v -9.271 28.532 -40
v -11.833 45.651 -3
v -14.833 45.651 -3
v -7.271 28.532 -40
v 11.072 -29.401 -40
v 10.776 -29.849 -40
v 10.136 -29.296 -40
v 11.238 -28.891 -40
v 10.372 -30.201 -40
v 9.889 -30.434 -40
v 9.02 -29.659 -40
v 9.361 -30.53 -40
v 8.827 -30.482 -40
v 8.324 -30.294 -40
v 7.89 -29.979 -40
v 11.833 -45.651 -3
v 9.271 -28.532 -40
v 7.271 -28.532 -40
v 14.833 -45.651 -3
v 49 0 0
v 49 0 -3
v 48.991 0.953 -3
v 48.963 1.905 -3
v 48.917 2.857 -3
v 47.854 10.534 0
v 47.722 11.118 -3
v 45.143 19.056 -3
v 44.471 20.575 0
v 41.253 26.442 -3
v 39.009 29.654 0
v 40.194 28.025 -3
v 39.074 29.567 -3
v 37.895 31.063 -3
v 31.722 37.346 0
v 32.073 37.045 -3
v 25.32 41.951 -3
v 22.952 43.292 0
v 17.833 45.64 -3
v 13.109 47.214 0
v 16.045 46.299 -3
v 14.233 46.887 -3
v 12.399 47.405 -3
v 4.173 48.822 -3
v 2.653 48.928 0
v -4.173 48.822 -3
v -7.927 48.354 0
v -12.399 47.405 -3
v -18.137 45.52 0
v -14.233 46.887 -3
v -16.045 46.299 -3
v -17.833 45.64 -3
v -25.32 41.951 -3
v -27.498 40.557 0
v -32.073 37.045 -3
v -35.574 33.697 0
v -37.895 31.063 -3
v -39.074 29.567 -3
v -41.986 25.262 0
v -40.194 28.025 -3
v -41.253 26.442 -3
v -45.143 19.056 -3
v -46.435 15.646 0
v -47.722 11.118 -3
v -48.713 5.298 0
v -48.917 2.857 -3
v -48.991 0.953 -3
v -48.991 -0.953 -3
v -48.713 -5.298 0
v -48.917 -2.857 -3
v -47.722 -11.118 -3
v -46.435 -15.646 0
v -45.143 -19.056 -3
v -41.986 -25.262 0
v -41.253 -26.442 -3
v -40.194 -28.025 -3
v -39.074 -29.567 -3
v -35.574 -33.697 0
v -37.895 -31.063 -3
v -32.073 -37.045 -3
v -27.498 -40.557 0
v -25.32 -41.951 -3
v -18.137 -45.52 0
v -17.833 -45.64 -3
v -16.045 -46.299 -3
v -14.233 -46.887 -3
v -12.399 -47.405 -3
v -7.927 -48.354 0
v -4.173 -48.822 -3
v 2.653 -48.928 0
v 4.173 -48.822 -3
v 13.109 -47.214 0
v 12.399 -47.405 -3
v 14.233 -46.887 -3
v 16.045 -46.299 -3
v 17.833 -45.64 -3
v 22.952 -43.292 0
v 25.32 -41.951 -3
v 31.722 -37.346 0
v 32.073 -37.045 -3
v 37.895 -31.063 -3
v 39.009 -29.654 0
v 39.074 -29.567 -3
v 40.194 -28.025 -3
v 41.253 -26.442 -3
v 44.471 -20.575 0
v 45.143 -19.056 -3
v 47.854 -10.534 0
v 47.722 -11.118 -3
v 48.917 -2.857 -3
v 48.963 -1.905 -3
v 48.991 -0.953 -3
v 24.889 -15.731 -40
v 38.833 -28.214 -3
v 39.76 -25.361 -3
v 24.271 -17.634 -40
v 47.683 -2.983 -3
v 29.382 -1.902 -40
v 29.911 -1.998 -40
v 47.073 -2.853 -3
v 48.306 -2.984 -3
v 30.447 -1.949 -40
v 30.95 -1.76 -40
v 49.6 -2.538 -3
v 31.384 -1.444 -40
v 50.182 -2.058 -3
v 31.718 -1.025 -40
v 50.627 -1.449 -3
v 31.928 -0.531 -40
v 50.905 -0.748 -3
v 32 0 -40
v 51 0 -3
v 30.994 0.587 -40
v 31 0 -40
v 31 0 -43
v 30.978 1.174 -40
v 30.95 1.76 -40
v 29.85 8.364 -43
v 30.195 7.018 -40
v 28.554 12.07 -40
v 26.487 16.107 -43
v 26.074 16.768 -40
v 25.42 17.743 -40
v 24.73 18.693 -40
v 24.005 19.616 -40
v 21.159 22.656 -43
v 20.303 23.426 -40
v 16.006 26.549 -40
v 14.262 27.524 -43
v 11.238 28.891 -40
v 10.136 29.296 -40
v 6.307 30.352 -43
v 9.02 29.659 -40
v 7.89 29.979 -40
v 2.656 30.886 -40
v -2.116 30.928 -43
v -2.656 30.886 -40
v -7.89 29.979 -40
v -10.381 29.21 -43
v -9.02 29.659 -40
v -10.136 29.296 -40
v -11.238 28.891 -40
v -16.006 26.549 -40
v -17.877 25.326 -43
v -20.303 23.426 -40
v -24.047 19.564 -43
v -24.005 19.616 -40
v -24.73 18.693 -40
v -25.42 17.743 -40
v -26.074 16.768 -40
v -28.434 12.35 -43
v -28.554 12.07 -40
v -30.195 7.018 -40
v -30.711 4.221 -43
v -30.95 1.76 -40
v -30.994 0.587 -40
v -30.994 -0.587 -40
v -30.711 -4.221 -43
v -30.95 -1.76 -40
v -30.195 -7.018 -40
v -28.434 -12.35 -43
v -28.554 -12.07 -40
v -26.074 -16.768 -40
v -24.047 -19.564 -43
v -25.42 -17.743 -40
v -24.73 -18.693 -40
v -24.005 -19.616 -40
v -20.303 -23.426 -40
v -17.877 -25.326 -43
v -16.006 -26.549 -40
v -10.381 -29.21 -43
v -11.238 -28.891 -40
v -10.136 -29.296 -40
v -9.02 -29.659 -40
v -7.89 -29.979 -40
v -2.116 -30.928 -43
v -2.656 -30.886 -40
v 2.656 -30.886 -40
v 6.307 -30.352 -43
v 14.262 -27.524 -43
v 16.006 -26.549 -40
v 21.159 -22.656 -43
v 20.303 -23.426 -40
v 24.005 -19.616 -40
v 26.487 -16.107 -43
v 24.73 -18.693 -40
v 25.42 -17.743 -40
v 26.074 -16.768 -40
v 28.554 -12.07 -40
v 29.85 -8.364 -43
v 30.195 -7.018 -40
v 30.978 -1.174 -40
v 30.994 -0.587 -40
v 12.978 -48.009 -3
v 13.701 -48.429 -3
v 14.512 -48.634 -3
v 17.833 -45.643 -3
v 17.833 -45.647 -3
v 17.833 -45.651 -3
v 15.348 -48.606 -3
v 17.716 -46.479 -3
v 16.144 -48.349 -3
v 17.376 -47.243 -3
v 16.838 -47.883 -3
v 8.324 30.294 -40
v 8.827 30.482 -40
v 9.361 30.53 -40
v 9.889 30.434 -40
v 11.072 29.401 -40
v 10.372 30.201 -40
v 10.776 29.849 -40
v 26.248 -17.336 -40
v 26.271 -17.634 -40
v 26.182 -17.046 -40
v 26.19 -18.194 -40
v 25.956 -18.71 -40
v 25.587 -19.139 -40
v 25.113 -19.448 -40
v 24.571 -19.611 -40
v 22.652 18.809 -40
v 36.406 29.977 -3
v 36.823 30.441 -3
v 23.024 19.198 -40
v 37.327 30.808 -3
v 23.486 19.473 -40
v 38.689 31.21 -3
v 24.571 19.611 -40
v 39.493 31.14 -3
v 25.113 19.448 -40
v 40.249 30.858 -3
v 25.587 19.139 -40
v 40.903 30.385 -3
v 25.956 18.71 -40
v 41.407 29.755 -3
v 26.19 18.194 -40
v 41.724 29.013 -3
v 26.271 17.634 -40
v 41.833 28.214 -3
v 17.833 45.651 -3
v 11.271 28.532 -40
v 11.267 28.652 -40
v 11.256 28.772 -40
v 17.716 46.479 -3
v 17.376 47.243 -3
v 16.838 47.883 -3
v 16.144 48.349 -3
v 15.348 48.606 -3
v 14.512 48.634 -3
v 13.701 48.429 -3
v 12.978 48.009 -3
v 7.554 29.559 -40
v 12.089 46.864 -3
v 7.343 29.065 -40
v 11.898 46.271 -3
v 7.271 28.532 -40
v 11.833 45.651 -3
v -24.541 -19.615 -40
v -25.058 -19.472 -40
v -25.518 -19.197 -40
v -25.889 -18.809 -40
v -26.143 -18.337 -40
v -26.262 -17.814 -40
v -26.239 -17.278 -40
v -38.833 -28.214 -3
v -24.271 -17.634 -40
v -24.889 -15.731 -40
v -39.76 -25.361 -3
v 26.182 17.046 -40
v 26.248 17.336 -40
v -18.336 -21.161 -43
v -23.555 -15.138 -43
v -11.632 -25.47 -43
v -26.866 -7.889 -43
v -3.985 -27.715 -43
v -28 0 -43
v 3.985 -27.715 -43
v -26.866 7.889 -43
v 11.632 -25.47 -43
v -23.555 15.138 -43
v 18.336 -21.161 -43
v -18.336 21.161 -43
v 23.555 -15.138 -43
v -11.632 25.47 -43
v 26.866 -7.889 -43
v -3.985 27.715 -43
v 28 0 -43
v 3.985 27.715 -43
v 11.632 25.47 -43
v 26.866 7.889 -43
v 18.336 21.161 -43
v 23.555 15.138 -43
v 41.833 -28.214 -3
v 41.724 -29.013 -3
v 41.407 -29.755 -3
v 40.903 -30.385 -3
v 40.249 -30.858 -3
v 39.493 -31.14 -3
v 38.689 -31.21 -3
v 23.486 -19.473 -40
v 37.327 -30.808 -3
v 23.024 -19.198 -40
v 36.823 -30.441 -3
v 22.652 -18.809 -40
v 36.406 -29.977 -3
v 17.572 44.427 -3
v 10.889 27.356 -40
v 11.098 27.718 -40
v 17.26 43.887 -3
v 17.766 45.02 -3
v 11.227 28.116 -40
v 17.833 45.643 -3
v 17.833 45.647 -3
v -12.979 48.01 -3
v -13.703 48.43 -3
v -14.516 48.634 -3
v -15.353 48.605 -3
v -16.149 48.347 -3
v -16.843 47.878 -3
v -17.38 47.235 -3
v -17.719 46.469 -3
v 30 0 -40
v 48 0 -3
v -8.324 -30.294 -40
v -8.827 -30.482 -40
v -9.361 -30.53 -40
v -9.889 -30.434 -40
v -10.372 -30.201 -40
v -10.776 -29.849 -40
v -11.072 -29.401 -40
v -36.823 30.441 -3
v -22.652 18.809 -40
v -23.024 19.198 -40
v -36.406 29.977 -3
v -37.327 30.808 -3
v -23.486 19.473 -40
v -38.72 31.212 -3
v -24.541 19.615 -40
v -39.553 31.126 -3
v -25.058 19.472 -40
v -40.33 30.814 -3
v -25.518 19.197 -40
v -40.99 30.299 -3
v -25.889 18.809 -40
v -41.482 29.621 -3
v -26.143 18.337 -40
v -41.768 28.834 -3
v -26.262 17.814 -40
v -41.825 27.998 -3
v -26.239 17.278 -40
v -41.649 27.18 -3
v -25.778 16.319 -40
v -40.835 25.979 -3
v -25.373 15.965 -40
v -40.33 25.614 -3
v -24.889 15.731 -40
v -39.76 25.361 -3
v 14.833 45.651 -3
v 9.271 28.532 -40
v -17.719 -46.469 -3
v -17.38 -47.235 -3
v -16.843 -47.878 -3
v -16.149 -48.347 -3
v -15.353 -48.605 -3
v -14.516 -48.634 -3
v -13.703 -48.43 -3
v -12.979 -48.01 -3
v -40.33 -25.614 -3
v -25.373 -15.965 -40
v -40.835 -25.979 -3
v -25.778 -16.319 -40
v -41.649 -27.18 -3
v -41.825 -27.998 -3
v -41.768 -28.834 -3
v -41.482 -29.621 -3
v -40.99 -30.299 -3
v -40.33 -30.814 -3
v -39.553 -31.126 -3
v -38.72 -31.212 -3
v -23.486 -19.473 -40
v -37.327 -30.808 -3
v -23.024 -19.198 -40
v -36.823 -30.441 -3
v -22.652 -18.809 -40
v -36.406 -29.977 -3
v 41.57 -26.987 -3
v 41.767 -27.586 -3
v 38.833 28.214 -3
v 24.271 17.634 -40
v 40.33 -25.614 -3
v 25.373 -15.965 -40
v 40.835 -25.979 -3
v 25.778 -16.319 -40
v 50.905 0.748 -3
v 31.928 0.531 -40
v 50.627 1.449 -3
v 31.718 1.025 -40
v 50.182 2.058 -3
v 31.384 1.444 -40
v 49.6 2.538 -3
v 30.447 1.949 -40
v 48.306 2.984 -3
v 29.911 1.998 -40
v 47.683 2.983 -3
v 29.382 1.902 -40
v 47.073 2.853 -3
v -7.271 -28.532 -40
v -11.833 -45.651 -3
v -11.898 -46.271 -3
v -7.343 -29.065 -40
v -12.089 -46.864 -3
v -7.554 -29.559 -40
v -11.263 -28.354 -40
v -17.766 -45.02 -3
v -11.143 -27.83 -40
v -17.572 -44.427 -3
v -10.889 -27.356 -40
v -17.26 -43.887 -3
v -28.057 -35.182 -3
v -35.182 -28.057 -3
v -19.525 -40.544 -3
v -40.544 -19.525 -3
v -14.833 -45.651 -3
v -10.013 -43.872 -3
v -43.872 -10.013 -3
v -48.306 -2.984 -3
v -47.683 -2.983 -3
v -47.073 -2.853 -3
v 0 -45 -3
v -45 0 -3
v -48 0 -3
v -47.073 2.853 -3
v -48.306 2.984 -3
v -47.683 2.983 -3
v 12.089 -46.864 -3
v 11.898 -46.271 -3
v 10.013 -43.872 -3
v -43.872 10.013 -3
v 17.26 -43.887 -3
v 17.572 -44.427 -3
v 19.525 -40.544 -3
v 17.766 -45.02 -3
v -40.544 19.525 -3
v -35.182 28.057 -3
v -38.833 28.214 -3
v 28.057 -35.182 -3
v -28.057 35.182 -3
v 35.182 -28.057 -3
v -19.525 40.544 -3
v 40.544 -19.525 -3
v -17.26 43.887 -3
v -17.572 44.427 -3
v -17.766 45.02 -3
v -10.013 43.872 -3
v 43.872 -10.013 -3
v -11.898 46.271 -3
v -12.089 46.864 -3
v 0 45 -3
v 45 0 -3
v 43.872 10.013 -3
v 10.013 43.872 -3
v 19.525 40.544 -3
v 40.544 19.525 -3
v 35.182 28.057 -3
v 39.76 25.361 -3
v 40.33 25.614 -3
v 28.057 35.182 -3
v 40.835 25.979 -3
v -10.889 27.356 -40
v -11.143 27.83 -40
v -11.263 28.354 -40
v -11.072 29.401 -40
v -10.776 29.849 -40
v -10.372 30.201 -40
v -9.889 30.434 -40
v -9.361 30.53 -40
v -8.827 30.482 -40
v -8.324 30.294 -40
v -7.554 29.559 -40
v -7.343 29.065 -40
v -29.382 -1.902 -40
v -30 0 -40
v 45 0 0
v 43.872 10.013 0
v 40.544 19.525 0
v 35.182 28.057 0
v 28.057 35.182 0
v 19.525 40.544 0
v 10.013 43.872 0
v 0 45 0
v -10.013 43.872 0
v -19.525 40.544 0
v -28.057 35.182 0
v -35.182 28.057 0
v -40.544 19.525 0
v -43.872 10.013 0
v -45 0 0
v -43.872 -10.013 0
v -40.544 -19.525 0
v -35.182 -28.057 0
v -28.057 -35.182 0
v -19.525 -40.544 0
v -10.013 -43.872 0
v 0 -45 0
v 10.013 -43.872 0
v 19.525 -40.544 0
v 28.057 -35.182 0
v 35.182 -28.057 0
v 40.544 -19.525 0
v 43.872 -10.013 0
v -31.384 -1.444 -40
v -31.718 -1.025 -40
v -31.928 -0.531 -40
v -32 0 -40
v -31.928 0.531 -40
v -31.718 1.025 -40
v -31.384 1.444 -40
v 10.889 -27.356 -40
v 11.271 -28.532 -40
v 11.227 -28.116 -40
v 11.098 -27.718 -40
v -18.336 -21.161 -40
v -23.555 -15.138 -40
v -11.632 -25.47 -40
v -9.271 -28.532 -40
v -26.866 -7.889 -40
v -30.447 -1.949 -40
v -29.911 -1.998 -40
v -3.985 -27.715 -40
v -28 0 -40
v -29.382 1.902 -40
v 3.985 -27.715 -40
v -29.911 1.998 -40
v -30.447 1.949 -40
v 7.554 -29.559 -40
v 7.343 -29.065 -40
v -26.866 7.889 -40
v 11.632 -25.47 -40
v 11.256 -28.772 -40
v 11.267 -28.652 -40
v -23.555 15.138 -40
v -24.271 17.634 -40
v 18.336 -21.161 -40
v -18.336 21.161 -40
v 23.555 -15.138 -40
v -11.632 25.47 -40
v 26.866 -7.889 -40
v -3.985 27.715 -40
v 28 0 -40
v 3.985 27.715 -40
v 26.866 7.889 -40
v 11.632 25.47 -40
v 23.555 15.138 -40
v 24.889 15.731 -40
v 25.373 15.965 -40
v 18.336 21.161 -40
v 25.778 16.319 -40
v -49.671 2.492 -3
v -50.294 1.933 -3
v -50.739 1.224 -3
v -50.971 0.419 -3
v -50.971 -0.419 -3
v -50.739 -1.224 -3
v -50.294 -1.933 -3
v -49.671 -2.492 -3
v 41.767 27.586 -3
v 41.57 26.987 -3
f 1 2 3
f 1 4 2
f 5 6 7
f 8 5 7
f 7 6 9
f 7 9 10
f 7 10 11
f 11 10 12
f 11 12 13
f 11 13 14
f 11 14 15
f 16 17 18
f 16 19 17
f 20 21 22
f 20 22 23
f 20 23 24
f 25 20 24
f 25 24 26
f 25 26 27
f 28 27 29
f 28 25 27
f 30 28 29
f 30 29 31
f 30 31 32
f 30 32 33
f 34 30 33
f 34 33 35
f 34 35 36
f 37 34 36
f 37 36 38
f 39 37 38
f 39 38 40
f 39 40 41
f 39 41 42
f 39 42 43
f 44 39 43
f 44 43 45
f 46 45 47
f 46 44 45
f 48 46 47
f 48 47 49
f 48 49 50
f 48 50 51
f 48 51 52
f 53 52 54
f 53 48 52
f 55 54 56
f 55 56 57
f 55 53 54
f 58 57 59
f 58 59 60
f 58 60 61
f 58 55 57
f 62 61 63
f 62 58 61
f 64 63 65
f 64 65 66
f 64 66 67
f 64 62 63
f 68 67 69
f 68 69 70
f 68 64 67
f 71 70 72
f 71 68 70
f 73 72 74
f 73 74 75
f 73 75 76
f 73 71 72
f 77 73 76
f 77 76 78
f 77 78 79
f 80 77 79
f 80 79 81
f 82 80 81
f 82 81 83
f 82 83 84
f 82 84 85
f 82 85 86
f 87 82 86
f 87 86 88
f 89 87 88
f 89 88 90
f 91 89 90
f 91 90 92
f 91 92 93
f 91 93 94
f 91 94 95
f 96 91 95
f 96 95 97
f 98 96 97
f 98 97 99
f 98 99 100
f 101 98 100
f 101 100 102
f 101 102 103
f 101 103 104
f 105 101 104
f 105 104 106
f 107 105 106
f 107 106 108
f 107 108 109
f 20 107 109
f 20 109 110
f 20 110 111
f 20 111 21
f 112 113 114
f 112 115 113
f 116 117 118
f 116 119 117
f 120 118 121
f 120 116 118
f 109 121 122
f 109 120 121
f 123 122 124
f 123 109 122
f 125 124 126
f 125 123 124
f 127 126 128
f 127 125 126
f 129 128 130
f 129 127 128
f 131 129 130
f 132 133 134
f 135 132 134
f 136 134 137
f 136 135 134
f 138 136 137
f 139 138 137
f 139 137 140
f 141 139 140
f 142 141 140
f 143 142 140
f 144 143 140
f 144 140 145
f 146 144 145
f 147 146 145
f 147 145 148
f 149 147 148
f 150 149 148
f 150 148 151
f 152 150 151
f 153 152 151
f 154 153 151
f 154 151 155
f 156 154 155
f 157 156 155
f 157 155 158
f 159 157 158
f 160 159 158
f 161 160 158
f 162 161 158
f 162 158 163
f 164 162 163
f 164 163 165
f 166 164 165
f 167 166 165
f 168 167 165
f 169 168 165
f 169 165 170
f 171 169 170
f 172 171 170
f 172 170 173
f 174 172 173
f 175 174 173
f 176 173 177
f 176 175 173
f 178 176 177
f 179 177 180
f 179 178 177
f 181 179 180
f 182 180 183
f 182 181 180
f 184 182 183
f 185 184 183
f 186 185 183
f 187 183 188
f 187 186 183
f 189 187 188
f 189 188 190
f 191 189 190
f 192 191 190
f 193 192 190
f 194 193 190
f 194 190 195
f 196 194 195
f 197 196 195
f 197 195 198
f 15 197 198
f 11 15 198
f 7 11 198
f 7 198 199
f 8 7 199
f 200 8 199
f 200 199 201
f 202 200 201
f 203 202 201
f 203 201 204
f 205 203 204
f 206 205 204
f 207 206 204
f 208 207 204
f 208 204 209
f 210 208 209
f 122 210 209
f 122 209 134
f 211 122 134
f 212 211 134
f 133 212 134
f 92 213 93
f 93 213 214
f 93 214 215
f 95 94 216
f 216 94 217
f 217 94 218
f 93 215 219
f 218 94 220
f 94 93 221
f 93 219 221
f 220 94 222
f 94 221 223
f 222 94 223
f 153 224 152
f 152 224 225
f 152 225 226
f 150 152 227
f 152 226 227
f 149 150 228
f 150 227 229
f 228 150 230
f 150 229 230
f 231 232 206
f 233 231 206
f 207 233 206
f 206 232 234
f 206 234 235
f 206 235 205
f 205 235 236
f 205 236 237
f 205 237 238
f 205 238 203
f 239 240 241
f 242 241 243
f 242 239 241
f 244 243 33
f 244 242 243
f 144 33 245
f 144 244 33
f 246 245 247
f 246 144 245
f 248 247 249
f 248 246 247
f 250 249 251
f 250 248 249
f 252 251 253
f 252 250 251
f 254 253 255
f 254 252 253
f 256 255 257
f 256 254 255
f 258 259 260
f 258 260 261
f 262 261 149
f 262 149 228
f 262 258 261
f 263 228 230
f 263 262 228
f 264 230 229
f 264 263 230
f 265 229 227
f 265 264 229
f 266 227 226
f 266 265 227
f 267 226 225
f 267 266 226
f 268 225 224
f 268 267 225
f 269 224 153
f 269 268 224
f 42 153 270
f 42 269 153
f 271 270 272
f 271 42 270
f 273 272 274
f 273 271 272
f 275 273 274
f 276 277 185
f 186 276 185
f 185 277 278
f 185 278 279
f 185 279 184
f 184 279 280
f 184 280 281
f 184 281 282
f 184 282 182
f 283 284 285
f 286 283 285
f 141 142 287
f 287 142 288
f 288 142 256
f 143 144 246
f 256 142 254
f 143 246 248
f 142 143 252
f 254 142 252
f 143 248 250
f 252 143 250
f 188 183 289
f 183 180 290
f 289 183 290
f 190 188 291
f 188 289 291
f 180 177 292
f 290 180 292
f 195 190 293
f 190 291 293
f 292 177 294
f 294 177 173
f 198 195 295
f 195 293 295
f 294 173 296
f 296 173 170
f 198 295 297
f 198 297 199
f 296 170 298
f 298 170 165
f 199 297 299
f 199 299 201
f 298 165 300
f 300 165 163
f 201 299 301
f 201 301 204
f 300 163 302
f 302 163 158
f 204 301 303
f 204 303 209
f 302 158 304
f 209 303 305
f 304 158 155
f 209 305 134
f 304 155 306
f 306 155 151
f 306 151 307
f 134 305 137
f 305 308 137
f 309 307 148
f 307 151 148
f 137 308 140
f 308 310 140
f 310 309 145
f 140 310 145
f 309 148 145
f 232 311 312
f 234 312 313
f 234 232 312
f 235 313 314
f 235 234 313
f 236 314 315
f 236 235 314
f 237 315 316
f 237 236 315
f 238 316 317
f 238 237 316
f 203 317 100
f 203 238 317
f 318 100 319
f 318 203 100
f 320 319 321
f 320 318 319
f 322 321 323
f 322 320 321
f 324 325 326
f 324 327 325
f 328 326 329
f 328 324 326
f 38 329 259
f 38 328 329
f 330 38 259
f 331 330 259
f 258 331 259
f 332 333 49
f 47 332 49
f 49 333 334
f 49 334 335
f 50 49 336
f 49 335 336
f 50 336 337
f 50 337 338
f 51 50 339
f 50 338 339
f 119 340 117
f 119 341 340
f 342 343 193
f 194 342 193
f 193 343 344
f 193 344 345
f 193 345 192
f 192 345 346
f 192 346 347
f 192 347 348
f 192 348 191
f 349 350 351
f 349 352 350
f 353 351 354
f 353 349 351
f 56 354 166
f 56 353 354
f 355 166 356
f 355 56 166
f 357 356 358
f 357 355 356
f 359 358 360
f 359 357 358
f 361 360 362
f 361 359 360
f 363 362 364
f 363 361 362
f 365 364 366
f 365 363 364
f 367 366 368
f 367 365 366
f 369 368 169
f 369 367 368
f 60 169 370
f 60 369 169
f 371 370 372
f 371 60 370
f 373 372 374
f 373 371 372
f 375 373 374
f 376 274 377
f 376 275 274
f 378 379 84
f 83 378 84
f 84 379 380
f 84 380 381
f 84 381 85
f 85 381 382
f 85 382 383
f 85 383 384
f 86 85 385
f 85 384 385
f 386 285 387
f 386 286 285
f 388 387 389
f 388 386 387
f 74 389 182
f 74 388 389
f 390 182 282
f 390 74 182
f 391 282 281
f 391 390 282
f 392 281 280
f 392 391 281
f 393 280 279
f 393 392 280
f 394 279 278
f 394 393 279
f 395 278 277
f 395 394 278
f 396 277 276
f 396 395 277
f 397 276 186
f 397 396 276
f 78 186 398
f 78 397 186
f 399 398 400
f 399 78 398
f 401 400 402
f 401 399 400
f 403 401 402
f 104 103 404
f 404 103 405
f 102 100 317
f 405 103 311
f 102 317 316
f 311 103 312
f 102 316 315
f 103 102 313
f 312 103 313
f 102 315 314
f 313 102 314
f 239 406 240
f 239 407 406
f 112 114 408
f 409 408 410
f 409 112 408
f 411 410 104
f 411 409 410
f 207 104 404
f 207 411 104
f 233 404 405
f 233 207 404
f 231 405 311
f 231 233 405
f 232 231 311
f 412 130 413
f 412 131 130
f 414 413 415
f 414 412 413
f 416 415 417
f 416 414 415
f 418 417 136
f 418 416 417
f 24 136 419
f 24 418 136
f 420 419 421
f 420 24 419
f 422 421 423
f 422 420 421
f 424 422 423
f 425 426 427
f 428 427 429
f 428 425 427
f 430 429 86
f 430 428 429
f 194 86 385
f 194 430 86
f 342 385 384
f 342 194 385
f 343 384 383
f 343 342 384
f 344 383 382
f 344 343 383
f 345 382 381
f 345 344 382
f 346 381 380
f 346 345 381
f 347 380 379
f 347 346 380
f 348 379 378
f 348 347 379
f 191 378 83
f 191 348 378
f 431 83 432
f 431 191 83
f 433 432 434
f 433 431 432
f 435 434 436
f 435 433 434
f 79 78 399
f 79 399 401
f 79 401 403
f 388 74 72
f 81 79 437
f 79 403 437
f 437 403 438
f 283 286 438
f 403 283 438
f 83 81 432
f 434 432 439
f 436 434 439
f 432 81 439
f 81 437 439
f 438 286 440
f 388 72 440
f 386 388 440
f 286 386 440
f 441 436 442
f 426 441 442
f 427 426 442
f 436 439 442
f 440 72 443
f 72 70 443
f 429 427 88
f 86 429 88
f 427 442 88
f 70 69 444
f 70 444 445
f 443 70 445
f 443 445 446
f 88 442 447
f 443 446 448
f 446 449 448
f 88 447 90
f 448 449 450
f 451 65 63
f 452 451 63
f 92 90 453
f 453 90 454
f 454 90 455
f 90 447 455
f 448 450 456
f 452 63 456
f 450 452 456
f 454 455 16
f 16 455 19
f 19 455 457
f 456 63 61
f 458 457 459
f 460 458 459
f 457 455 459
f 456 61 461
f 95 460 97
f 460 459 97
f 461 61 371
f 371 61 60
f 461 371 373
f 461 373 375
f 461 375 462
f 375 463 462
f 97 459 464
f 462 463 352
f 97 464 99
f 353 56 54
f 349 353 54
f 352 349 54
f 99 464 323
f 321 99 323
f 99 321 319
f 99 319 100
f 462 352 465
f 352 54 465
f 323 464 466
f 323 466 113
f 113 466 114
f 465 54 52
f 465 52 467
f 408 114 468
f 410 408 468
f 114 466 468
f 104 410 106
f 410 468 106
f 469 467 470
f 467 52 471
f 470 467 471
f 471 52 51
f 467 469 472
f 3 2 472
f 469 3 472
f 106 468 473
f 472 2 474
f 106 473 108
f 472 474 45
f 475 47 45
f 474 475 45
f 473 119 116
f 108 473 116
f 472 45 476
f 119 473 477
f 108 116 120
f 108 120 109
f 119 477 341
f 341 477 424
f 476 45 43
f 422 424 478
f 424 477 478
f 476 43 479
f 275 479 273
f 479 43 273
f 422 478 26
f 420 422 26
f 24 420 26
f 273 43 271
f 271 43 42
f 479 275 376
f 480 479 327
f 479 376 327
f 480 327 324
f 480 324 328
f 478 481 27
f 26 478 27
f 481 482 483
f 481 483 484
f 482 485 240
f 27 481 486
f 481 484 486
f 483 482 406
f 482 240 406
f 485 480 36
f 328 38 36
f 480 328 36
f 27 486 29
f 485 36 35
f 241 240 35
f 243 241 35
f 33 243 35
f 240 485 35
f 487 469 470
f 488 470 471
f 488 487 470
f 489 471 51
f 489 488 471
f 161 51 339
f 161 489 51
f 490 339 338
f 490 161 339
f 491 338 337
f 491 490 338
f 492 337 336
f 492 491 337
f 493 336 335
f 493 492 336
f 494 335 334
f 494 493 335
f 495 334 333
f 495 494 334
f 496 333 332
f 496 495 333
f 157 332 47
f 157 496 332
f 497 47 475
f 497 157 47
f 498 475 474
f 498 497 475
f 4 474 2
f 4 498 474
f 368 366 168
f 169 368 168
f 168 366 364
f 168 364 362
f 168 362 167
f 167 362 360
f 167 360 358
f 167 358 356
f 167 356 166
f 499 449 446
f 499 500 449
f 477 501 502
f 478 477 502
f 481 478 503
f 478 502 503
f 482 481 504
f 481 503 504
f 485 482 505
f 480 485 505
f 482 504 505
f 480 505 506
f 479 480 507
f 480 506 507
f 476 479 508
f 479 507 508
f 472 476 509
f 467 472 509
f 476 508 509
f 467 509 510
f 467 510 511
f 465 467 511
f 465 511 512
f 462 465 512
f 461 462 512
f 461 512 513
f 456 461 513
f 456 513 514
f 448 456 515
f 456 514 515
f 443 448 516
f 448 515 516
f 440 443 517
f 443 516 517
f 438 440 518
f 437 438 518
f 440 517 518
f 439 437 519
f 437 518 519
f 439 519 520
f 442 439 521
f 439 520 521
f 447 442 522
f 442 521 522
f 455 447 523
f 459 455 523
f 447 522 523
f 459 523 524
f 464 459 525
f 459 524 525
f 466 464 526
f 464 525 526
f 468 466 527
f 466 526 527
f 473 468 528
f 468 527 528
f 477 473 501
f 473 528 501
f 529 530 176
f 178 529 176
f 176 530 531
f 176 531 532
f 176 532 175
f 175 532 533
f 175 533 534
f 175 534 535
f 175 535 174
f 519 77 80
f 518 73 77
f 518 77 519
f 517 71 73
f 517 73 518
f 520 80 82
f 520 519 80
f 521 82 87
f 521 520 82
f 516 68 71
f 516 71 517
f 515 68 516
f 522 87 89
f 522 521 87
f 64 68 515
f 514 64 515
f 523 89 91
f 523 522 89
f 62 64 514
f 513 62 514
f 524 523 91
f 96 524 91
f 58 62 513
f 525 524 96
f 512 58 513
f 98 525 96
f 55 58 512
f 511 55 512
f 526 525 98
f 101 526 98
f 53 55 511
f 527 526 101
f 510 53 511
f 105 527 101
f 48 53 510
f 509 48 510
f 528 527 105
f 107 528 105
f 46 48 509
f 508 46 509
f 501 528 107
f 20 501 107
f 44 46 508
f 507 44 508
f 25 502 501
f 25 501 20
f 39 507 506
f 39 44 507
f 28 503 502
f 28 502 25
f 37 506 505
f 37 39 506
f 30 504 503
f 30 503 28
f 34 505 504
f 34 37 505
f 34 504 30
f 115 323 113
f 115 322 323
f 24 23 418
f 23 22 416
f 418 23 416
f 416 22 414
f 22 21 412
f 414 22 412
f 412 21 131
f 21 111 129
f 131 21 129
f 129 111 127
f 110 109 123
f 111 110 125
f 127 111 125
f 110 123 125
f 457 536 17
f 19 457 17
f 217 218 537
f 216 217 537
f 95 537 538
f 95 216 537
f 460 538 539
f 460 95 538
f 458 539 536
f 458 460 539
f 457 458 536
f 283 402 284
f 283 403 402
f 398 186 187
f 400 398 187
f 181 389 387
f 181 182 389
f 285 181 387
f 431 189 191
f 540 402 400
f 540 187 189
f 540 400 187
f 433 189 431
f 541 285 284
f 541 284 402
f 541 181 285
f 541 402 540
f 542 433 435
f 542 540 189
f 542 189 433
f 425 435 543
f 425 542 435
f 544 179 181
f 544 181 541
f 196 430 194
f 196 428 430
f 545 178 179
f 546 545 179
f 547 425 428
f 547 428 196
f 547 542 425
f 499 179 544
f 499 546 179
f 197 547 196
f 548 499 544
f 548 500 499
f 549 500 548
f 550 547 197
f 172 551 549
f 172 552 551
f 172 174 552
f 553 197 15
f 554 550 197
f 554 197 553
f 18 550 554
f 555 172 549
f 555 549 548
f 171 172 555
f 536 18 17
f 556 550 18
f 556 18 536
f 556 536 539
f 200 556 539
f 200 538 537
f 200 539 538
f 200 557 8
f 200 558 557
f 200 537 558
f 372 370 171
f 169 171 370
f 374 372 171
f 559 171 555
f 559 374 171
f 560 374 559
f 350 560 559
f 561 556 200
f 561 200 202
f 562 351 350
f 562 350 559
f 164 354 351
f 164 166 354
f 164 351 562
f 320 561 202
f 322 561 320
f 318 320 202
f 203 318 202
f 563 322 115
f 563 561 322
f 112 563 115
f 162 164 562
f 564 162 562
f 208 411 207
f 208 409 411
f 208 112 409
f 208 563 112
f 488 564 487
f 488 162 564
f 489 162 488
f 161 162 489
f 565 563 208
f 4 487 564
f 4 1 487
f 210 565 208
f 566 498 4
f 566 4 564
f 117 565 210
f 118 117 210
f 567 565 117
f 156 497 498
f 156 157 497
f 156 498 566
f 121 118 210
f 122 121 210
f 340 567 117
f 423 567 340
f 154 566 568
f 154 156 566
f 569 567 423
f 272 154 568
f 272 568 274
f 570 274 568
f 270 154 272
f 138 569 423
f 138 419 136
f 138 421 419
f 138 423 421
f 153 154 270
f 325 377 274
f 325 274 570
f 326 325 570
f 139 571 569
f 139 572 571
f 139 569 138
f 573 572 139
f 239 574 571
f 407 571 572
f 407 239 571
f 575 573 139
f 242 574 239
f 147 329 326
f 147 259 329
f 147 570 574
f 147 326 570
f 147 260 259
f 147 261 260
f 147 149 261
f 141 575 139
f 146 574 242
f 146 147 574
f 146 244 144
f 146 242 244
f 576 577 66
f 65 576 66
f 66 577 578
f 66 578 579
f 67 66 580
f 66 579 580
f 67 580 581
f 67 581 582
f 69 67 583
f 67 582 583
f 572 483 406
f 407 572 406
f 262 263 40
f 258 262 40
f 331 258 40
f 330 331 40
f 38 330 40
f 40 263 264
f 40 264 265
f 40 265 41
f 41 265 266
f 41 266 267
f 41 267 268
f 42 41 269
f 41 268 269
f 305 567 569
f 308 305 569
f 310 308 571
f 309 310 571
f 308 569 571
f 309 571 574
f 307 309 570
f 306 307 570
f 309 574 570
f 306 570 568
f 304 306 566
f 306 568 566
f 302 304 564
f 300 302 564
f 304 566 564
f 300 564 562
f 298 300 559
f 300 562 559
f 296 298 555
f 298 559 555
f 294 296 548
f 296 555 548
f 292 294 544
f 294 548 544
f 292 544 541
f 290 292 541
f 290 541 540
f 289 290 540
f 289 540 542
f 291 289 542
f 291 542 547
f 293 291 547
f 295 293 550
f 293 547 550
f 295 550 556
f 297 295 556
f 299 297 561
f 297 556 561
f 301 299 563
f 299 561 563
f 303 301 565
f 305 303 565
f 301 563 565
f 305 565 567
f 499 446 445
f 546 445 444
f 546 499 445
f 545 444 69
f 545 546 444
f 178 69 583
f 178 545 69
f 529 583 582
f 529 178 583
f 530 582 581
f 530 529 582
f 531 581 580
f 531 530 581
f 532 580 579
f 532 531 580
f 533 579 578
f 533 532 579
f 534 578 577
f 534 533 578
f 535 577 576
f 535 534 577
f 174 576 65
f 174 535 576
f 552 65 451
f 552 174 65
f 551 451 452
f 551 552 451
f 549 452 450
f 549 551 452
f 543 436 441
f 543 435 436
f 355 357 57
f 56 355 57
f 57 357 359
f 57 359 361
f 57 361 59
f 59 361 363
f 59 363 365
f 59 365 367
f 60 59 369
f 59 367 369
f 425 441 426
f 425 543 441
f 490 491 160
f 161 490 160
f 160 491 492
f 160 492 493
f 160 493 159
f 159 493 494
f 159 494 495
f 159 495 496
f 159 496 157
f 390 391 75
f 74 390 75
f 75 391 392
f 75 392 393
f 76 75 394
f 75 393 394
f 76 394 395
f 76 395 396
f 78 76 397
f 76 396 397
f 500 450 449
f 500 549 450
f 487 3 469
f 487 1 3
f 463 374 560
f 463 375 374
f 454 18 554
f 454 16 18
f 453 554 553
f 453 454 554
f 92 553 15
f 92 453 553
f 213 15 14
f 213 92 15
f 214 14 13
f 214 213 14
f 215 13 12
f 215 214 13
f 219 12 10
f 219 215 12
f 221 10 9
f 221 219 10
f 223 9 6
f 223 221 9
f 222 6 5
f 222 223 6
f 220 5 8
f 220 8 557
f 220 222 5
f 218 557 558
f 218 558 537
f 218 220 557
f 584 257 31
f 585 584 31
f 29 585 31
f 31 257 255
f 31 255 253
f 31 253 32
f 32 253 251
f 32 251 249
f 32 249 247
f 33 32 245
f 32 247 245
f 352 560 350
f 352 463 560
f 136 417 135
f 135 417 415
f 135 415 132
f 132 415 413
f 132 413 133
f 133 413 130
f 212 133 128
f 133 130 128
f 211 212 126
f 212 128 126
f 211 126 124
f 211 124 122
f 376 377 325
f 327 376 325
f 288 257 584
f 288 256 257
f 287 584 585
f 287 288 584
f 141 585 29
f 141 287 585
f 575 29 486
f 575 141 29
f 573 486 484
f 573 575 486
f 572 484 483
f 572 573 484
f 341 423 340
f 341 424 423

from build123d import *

# Parameters (mm, degrees)
F0_R     = 45
F1_DEPTH = 3
F0_R_2   = 49
F3_DEPTH = 3
F5_R     = 28
F6_DEPTH = 3
F5_R_2   = 31
F8_DEPTH = 3


with BuildPart() as f1:
    # F0 (on Top) → F1 (new body)
    with BuildSketch(Plane.XY):
        Polygon((38.83281573, -28.21369211), (48, 0), (38.83281573, 28.21369211), (14.83281573, 45.6507127822), (-14.83281573, 45.6507127822), (-38.83281573, 28.21369211), (-48, 0), (-38.83281573, -28.21369211), (-14.83281573, -45.6507127822), (14.83281573, -45.6507127822), align=None)
        Circle(F0_R, mode=Mode.SUBTRACT)
    extrude(amount=-F1_DEPTH)

    # F0 (on Top) → F3 (join)
    with BuildSketch(Plane.XY):
        Circle(F0_R_2)
        Polygon((38.83281573, 28.21369211), (48, 0), (38.83281573, -28.21369211), (14.83281573, -45.6507127822), (-14.83281573, -45.6507127822), (-38.83281573, -28.21369211), (-48, 0), (-38.83281573, 28.21369211), (-14.83281573, 45.6507127822), (14.83281573, 45.6507127822), align=None, mode=Mode.SUBTRACT)
    extrude(amount=-F3_DEPTH)



with BuildPart() as f6:
    # F5 (on offset) → F6 (new body)
    with BuildSketch(Plane.XY.offset(-40)):
        Polygon((24.2705098312, -17.6335575688), (30, 0), (24.2705098312, 17.6335575688), (9.2705098312, 28.5316954889), (-9.2705098312, 28.5316954889), (-24.2705098312, 17.6335575688), (-30, 0), (-24.2705098312, -17.6335575688), (-9.2705098312, -28.5316954889), (9.2705098312, -28.5316954889), align=None)
        Circle(F5_R, mode=Mode.SUBTRACT)
    extrude(amount=-F6_DEPTH)

    # F5 (on offset) → F8 (join)
    with BuildSketch(Plane.XY.offset(-40)):
        Circle(F5_R_2)
        Polygon((24.2705098312, 17.6335575688), (30, 0), (24.2705098312, -17.6335575688), (9.2705098312, -28.5316954889), (-9.2705098312, -28.5316954889), (-24.2705098312, -17.6335575688), (-30, 0), (-24.2705098312, 17.6335575688), (-9.2705098312, 28.5316954889), (9.2705098312, 28.5316954889), align=None, mode=Mode.SUBTRACT)
    extrude(amount=-F8_DEPTH)


with BuildPart() as f1_1:
    add(f1.part)

    add(f6.part)  # F9 merges F6
    # F2 (on face) → F9 section 0
    with BuildSketch(Plane(origin=(0, 0, -3), x_dir=(1, 0, 0), z_dir=(0, 0, -1))):
        with BuildLine():
            ThreePointArc((-47.0729490169, 2.8531695489), (-51, 0), (-47.0729490169, -2.8531695489))
            Line((-47.0729490169, -2.8531695489), (-48, 0))
            Line((-48, 0), (-47.0729490169, 2.8531695489))
        make_face()
    # F7 (on face) → F9 section 1
    with BuildSketch(Plane.XY.offset(-40)):
        with BuildLine():
            ThreePointArc((-29.3819660113, 1.9021130326), (-32, 0), (-29.3819660113, -1.9021130326))
            Line((-29.3819660113, -1.9021130326), (-30, 0))
            Line((-30, 0), (-29.3819660113, 1.9021130326))
        make_face()
    loft()

    # F7 (on face) → F10 section 0
    with BuildSketch(Plane.XY.offset(-40)):
        with BuildLine():
            ThreePointArc((-24.88854382, -15.7314445362), (-25.88854382, -18.8091280734), (-22.6524758425, -18.8091280734))
            Line((-22.6524758425, -18.8091280734), (-24.2705098312, -17.6335575688))
            Line((-24.2705098312, -17.6335575688), (-24.88854382, -15.7314445362))
        make_face()
    # F2 (on face) → F10 section 1
    with BuildSketch(Plane(origin=(0, 0, -3), x_dir=(1, 0, 0), z_dir=(0, 0, -1))):
        with BuildLine():
            ThreePointArc((-36.4057647469, 29.9770478669), (-41.2598667131, 29.9770478669), (-39.7598667131, 25.3605225612))
            Line((-39.7598667131, 25.3605225612), (-38.83281573, 28.21369211))
            Line((-38.83281573, 28.21369211), (-36.4057647469, 29.9770478669))
        make_face()
    loft()

    # F2 (on face) → F11 section 0
    with BuildSketch(Plane(origin=(0, 0, -3), x_dir=(1, 0, 0), z_dir=(0, 0, -1))):
        with BuildLine():
            ThreePointArc((-11.83281573, 45.6507127822), (-15.7598667131, 48.5038823311), (-17.2598667131, 43.8873570253))
            Line((-17.2598667131, 43.8873570253), (-14.83281573, 45.6507127822))
            Line((-14.83281573, 45.6507127822), (-11.83281573, 45.6507127822))
        make_face()
    # F7 (on face) → F11 section 1
    with BuildSketch(Plane.XY.offset(-40)):
        with BuildLine():
            Line((-9.2705098312, -28.5316954889), (-10.88854382, -27.3561249843))
            ThreePointArc((-10.88854382, -27.3561249843), (-9.88854382, -30.4338085214), (-7.2705098312, -28.5316954889))
            Line((-7.2705098312, -28.5316954889), (-9.2705098312, -28.5316954889))
        make_face()
    loft()

    # F7 (on face) → F12 section 0
    with BuildSketch(Plane.XY.offset(-40)):
        with BuildLine():
            Line((9.2705098312, -28.5316954889), (7.2705098312, -28.5316954889))
            ThreePointArc((7.2705098312, -28.5316954889), (9.2705098312, -30.5316954889), (11.2705098312, -28.5316954889))
            ThreePointArc((11.2705098312, -28.5316954889), (11.1726228638, -27.9136615001), (10.88854382, -27.3561249843))
            Line((10.88854382, -27.3561249843), (9.2705098312, -28.5316954889))
        make_face()
    # F2 (on face) → F12 section 1
    with BuildSketch(Plane(origin=(0, 0, -3), x_dir=(1, 0, 0), z_dir=(0, 0, -1))):
        with BuildLine():
            ThreePointArc((17.83281573, 45.6507127822), (14.83281573, 48.6507127822), (11.83281573, 45.6507127822))
            Line((11.83281573, 45.6507127822), (14.83281573, 45.6507127822))
            Line((14.83281573, 45.6507127822), (17.2598667131, 43.8873570253))
            ThreePointArc((17.2598667131, 43.8873570253), (17.6859852789, 44.723661799), (17.83281573, 45.6507127822))
        make_face()
    loft()

    # F2 (on face) → F13 section 0
    with BuildSketch(Plane(origin=(0, 0, -3), x_dir=(1, 0, 0), z_dir=(0, 0, -1))):
        with BuildLine():
            ThreePointArc((41.83281573, 28.21369211), (39.7598667131, 31.0668616589), (36.4057647469, 29.9770478669))
            Line((36.4057647469, 29.9770478669), (38.83281573, 28.21369211))
            Line((38.83281573, 28.21369211), (39.7598667131, 25.3605225612))
            ThreePointArc((39.7598667131, 25.3605225612), (41.2598667131, 26.4503363532), (41.83281573, 28.21369211))
        make_face()
    # F7 (on face) → F13 section 1
    with BuildSketch(Plane.XY.offset(-40)):
        with BuildLine():
            Line((24.2705098312, -17.6335575688), (22.6524758425, -18.8091280734))
            ThreePointArc((22.6524758425, -18.8091280734), (24.88854382, -19.5356706014), (26.2705098312, -17.6335575688))
            ThreePointArc((26.2705098312, -17.6335575688), (25.88854382, -16.4579870642), (24.88854382, -15.7314445362))
            Line((24.88854382, -15.7314445362), (24.2705098312, -17.6335575688))
        make_face()
    loft()

    # F7 (on face) → F14 section 0
    with BuildSketch(Plane.XY.offset(-40)):
        with BuildLine():
            Line((30, 0), (29.3819660113, -1.9021130326))
            ThreePointArc((29.3819660113, -1.9021130326), (31.1755705046, -1.6180339887), (32, 0))
            ThreePointArc((32, 0), (31.1755705046, 1.6180339887), (29.3819660113, 1.9021130326))
            Line((29.3819660113, 1.9021130326), (30, 0))
        make_face()
    # F2 (on face) → F14 section 1
    with BuildSketch(Plane(origin=(0, 0, -3), x_dir=(1, 0, 0), z_dir=(0, 0, -1))):
        with BuildLine():
            Line((48, 0), (47.0729490169, -2.8531695489))
            ThreePointArc((47.0729490169, -2.8531695489), (49.7633557569, -2.4270509831), (51, 0))
            ThreePointArc((51, 0), (49.7633557569, 2.4270509831), (47.0729490169, 2.8531695489))
            Line((47.0729490169, 2.8531695489), (48, 0))
        make_face()
    loft()

    # F2 (on face) → F15 section 0
    with BuildSketch(Plane(origin=(0, 0, -3), x_dir=(1, 0, 0), z_dir=(0, 0, -1))):
        with BuildLine():
            Line((38.83281573, -28.21369211), (36.4057647469, -29.9770478669))
            ThreePointArc((36.4057647469, -29.9770478669), (39.7598667131, -31.0668616589), (41.83281573, -28.21369211))
            ThreePointArc((41.83281573, -28.21369211), (41.2598667131, -26.4503363532), (39.7598667131, -25.3605225612))
            Line((39.7598667131, -25.3605225612), (38.83281573, -28.21369211))
        make_face()
    # F7 (on face) → F15 section 1
    with BuildSketch(Plane.XY.offset(-40)):
        with BuildLine():
            ThreePointArc((26.2705098312, 17.6335575688), (24.88854382, 19.5356706014), (22.6524758425, 18.8091280734))
            Line((22.6524758425, 18.8091280734), (24.2705098312, 17.6335575688))
            Line((24.2705098312, 17.6335575688), (24.88854382, 15.7314445362))
            ThreePointArc((24.88854382, 15.7314445362), (25.88854382, 16.4579870642), (26.2705098312, 17.6335575688))
        make_face()
    loft()

    # F7 (on face) → F16 section 0
    with BuildSketch(Plane.XY.offset(-40)):
        with BuildLine():
            ThreePointArc((11.2705098312, 28.5316954889), (9.2705098312, 30.5316954889), (7.2705098312, 28.5316954889))
            Line((7.2705098312, 28.5316954889), (9.2705098312, 28.5316954889))
            Line((9.2705098312, 28.5316954889), (10.88854382, 27.3561249843))
            ThreePointArc((10.88854382, 27.3561249843), (11.1726228638, 27.9136615001), (11.2705098312, 28.5316954889))
        make_face()
    # F2 (on face) → F16 section 1
    with BuildSketch(Plane(origin=(0, 0, -3), x_dir=(1, 0, 0), z_dir=(0, 0, -1))):
        with BuildLine():
            Line((14.83281573, -45.6507127822), (11.83281573, -45.6507127822))
            ThreePointArc((11.83281573, -45.6507127822), (14.83281573, -48.6507127822), (17.83281573, -45.6507127822))
            ThreePointArc((17.83281573, -45.6507127822), (17.6859852789, -44.723661799), (17.2598667131, -43.8873570253))
            Line((17.2598667131, -43.8873570253), (14.83281573, -45.6507127822))
        make_face()
    loft()

    # F2 (on face) → F17 section 0
    with BuildSketch(Plane(origin=(0, 0, -3), x_dir=(1, 0, 0), z_dir=(0, 0, -1))):
        with BuildLine():
            Line((-14.83281573, -45.6507127822), (-17.2598667131, -43.8873570253))
            ThreePointArc((-17.2598667131, -43.8873570253), (-15.7598667131, -48.5038823311), (-11.83281573, -45.6507127822))
            Line((-11.83281573, -45.6507127822), (-14.83281573, -45.6507127822))
        make_face()
    # F7 (on face) → F17 section 1
    with BuildSketch(Plane.XY.offset(-40)):
        with BuildLine():
            ThreePointArc((-7.2705098312, 28.5316954889), (-9.88854382, 30.4338085214), (-10.88854382, 27.3561249843))
            Line((-10.88854382, 27.3561249843), (-9.2705098312, 28.5316954889))
            Line((-9.2705098312, 28.5316954889), (-7.2705098312, 28.5316954889))
        make_face()
    loft()

    # F7 (on face) → F18 section 0
    with BuildSketch(Plane.XY.offset(-40)):
        with BuildLine():
            ThreePointArc((-22.6524758425, 18.8091280734), (-25.88854382, 18.8091280734), (-24.88854382, 15.7314445362))
            Line((-24.88854382, 15.7314445362), (-24.2705098312, 17.6335575688))
            Line((-24.2705098312, 17.6335575688), (-22.6524758425, 18.8091280734))
        make_face()
    # F2 (on face) → F18 section 1
    with BuildSketch(Plane(origin=(0, 0, -3), x_dir=(1, 0, 0), z_dir=(0, 0, -1))):
        with BuildLine():
            ThreePointArc((-39.7598667131, -25.3605225612), (-41.2598667131, -29.9770478669), (-36.4057647469, -29.9770478669))
            Line((-36.4057647469, -29.9770478669), (-38.83281573, -28.21369211))
            Line((-38.83281573, -28.21369211), (-39.7598667131, -25.3605225612))
        make_face()
    loft()


solid = f1_1.part
